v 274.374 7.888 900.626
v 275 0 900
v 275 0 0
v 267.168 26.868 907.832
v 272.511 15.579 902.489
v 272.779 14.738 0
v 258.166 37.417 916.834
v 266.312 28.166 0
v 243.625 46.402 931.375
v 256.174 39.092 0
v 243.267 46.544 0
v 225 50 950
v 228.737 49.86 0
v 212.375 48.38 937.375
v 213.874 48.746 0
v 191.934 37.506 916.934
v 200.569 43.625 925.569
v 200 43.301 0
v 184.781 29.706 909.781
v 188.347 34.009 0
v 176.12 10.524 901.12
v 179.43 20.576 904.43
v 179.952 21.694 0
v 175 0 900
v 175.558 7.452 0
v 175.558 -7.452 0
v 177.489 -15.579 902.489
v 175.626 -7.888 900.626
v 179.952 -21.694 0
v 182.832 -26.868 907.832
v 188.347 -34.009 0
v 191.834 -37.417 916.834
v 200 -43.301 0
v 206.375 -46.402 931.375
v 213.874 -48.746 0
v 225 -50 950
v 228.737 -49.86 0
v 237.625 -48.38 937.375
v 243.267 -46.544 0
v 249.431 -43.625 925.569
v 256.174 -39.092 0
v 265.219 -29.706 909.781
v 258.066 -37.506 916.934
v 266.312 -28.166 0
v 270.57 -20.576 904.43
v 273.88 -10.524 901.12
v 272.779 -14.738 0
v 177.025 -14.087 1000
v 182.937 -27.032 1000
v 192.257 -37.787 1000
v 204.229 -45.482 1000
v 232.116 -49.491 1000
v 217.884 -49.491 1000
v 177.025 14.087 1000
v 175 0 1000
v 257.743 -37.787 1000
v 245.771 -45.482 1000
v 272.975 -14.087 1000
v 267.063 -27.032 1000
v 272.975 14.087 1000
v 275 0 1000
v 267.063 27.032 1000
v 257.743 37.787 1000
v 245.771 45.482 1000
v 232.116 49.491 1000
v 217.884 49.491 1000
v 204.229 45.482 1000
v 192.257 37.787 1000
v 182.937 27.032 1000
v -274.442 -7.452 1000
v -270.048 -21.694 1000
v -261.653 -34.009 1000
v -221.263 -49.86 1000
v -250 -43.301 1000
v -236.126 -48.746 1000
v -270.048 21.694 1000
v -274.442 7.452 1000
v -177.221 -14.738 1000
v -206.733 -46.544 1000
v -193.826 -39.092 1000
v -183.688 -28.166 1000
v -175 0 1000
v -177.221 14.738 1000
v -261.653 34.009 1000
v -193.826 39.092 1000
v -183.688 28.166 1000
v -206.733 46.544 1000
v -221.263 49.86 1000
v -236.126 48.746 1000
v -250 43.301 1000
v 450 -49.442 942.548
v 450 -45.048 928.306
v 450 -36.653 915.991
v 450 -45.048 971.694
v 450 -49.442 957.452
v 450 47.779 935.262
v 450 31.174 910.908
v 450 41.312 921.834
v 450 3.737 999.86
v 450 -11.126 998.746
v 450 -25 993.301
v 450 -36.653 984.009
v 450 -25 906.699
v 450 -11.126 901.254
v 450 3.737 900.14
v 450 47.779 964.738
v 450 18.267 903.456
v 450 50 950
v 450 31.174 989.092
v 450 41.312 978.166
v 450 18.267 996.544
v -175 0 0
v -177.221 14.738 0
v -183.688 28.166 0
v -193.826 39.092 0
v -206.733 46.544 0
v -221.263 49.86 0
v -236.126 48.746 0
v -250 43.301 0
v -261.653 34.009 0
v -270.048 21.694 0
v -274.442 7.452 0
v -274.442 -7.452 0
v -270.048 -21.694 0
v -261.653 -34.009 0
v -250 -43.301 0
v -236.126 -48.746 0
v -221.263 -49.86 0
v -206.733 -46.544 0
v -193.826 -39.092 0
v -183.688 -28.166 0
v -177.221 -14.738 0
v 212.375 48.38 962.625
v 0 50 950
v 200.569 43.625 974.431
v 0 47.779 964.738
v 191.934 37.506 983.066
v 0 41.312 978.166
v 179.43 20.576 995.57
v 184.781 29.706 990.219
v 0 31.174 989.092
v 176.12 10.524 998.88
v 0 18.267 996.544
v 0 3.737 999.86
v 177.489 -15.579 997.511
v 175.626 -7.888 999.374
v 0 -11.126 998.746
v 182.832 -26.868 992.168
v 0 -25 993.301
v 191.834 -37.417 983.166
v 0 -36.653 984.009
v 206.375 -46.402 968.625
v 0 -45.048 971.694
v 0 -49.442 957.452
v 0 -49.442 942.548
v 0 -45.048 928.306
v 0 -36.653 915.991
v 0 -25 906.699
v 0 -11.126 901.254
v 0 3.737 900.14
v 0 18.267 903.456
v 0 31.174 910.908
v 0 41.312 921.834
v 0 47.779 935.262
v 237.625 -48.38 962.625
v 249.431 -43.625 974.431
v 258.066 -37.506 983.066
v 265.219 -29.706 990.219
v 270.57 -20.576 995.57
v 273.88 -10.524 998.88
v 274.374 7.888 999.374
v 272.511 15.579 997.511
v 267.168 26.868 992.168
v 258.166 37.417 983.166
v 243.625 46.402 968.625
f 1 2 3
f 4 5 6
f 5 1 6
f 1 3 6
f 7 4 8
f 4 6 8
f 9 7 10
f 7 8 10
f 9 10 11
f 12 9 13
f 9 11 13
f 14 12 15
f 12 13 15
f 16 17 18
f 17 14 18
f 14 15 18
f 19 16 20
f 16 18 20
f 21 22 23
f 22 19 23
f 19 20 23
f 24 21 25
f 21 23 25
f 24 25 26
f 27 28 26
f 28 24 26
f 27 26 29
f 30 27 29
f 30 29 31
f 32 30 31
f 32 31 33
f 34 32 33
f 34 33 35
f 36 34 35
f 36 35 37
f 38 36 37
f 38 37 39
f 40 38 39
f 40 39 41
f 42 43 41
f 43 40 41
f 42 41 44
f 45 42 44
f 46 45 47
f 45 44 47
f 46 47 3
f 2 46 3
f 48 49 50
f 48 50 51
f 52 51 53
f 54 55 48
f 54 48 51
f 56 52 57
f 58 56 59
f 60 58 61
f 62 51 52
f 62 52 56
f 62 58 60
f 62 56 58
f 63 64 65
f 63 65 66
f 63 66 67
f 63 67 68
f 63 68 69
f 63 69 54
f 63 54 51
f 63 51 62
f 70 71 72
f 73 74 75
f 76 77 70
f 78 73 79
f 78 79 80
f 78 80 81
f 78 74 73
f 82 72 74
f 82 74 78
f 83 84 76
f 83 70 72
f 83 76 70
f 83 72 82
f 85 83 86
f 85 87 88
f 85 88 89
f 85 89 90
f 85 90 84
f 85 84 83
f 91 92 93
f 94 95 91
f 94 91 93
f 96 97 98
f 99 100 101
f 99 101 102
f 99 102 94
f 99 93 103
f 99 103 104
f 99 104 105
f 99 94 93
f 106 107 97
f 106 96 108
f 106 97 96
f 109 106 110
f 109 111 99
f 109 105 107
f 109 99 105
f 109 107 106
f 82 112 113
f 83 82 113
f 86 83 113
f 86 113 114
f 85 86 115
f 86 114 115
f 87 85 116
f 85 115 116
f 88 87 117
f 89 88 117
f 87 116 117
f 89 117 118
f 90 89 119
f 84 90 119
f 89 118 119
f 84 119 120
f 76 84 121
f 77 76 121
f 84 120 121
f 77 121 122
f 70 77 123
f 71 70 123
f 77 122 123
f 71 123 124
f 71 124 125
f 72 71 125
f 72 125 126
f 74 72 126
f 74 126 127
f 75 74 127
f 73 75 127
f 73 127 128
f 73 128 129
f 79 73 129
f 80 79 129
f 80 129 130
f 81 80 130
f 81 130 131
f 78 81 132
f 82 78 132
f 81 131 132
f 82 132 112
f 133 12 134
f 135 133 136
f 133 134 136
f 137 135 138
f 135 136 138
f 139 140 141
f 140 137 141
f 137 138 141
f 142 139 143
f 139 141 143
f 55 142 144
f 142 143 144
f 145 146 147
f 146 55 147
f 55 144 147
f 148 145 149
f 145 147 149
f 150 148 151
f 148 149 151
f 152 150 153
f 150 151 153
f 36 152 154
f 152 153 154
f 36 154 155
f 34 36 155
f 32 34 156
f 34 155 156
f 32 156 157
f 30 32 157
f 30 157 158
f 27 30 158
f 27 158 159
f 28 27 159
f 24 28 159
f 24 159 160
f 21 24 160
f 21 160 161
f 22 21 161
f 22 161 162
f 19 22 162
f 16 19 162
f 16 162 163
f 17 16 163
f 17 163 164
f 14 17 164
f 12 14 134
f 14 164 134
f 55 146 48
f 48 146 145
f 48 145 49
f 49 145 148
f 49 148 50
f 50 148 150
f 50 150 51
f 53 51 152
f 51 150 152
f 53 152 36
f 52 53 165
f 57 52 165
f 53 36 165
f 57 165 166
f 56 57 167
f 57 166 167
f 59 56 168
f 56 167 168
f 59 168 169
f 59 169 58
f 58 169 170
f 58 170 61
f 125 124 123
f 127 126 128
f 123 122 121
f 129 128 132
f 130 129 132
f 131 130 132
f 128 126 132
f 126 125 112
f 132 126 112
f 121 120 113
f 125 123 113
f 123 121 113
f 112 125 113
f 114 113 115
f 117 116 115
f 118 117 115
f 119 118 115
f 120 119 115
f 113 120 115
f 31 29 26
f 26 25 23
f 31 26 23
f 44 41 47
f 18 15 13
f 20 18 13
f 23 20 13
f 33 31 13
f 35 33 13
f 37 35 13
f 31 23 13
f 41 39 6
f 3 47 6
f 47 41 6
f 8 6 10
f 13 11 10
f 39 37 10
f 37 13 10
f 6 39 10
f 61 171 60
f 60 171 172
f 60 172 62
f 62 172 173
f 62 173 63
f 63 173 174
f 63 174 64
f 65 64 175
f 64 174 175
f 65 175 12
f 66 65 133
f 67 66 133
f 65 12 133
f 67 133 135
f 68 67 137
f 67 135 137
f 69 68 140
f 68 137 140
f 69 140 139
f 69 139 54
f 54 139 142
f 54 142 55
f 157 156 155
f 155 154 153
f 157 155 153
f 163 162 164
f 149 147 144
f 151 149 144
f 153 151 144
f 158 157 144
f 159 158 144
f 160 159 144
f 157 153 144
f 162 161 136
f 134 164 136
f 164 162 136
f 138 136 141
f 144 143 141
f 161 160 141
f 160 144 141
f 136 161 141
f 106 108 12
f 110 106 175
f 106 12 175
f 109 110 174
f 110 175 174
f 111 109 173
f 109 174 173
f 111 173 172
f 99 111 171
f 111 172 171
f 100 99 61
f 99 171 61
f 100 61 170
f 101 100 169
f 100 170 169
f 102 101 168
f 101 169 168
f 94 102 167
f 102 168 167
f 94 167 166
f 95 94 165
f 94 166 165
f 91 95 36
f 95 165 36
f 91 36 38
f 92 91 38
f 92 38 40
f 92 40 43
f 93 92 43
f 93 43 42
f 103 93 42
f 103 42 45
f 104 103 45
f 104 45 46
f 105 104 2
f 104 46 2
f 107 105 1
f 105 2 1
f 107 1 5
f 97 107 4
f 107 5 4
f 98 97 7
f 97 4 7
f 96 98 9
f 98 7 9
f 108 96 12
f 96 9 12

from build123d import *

# Parameters (mm, degrees)
F0_R     = 50
F1_DEPTH = 1000
F2_R     = 50
F3_DEPTH = 450


with BuildPart() as f1:
    # F0 (on Top) → F1 (new body)
    with BuildSketch(Plane.XY):
        with Locations((225, 0)):
            Circle(F0_R)
        with Locations((-225, 0)):
            Circle(F0_R)
    extrude(amount=F1_DEPTH)

    # F2 (on Right) → F3 (join)
    with BuildSketch(Plane.YZ):
        with Locations((0, 950)):
            Circle(F2_R)
    extrude(amount=F3_DEPTH)


solid = f1.part
